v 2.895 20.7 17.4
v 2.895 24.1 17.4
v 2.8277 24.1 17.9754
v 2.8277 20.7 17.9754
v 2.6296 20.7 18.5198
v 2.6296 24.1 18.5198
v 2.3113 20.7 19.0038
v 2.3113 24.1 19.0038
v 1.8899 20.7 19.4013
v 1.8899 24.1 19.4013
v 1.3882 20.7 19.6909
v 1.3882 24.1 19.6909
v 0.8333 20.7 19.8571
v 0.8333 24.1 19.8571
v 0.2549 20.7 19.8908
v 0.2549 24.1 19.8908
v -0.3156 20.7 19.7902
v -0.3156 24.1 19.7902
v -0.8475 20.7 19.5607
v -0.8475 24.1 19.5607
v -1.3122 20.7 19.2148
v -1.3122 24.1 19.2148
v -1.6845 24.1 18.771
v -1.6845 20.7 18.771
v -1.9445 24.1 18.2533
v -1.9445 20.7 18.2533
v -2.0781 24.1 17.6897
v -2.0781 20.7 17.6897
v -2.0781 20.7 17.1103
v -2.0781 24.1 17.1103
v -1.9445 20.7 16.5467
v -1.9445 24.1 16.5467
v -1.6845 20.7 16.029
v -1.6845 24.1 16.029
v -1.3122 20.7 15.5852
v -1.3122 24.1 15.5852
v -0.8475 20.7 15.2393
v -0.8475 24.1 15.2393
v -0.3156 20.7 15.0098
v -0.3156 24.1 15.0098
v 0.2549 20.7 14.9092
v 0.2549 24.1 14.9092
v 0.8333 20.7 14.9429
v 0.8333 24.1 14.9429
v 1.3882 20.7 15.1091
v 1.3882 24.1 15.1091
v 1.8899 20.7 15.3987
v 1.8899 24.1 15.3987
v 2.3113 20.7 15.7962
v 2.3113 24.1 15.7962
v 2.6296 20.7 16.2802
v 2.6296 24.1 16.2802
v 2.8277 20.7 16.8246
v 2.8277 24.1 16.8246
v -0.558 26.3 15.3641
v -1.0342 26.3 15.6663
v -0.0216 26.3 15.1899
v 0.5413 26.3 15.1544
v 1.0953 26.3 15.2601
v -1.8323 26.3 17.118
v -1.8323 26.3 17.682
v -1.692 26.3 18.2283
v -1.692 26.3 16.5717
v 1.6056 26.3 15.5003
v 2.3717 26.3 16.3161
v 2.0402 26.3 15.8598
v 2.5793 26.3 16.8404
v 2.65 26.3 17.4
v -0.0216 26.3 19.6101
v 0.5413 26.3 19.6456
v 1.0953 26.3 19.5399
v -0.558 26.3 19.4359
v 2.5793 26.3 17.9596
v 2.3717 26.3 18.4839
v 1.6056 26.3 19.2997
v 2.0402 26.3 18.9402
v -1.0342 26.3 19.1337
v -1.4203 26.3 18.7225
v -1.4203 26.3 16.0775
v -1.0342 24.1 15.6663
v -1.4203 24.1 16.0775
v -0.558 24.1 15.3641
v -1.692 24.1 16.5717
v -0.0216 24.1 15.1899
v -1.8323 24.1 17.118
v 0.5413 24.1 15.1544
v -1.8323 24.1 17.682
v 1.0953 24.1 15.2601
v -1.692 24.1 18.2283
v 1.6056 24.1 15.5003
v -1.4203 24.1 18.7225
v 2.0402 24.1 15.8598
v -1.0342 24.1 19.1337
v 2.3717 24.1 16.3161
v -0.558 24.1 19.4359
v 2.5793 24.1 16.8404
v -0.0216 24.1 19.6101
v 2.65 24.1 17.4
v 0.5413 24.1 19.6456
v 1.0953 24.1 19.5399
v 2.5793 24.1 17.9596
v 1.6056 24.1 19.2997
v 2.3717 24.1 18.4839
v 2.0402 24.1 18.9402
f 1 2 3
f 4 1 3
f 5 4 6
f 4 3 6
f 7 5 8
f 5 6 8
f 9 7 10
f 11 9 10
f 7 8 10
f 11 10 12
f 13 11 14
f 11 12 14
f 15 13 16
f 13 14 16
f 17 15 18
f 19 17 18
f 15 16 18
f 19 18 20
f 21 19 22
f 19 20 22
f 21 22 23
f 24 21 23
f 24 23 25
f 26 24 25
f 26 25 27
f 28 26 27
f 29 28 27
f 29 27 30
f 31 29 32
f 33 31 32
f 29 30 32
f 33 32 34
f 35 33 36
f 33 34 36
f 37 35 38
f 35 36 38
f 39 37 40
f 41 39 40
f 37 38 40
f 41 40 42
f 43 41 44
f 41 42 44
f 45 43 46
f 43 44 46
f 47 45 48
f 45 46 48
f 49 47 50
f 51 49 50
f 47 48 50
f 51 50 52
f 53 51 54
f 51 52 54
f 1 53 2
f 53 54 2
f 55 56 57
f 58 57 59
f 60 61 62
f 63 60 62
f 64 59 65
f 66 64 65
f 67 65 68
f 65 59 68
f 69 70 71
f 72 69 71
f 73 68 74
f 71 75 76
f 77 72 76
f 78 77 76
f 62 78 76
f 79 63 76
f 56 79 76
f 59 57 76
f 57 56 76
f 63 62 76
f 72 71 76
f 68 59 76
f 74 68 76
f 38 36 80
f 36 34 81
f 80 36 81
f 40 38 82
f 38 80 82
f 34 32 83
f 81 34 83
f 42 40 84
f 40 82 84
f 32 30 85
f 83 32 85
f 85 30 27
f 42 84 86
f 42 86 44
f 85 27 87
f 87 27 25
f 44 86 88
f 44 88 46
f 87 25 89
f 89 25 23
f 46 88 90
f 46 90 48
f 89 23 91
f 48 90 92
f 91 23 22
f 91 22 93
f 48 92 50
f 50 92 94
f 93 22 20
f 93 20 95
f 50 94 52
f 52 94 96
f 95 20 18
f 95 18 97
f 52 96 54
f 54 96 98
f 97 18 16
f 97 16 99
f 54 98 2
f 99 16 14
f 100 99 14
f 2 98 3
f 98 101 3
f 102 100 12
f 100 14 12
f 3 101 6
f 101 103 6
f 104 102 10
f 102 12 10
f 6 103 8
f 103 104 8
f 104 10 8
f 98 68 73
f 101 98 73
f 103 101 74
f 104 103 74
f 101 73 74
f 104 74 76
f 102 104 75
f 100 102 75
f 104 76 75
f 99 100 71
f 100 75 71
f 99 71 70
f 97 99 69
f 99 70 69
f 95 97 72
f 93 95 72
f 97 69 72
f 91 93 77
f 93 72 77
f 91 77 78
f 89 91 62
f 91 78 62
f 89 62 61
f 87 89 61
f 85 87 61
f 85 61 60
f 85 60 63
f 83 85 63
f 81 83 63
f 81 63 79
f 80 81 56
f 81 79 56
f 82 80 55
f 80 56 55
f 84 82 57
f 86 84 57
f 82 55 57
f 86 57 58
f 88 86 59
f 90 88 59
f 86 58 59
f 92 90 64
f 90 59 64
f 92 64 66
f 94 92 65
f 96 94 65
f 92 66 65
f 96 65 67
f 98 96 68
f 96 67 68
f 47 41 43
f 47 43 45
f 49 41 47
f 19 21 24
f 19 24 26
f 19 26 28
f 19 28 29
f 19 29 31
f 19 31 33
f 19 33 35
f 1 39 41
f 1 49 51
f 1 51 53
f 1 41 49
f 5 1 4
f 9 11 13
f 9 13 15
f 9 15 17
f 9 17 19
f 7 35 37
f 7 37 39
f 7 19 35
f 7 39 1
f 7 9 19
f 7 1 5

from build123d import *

# Parameters (mm, degrees)
SKETCH067_R             = 2.25
PAD046_DEPTH            = 2.2
SKETCH068_R             = 2.495
PAD047_DEPTH            = 3.4
POCKET019_DEPTH         = 4.4
POLARPATTERN_COUNT      = 80
BODY011_PLACEMENT_ANGLE = 90


with BuildPart() as part:
    # Sketch067 → Pad046 (new body)
    with BuildSketch(Plane.XY):
        Circle(SKETCH067_R)
    extrude(amount=PAD046_DEPTH)

    # Sketch068 (on Face3 of Pad046) → Pad047 (join)
    with BuildSketch(Plane.XY.offset(2.2)):
        Circle(SKETCH068_R)
    extrude(amount=PAD047_DEPTH)

    # Sketch069 (on Face3 of Pad047) → Pocket019 (cut)
    with BuildSketch(Plane.XY.offset(5.6)):
        Polygon((3.3, 0.172946), (3, 0), (3.3, -0.172946), align=None)
    pocket019 = extrude(amount=-POCKET019_DEPTH, mode=Mode.SUBTRACT)

    # PolarPattern: Pocket019 ×80 about axis
    polarpattern_axis = Axis((0, 0, 5.6), (0, 0, 1))
    for i in range(1, POLARPATTERN_COUNT):
        add(pocket019.rotate(polarpattern_axis, i * 360 / POLARPATTERN_COUNT), mode=Mode.SUBTRACT)


with BuildPart() as part_1:
    # Body011 placement: moved
    add(part.part.moved(Location((0.4, 26.3, 17.4))).rotate(Axis((0.4, 26.3, 17.4), (1, 0, 0)), BODY011_PLACEMENT_ANGLE))


solid = part_1.part
